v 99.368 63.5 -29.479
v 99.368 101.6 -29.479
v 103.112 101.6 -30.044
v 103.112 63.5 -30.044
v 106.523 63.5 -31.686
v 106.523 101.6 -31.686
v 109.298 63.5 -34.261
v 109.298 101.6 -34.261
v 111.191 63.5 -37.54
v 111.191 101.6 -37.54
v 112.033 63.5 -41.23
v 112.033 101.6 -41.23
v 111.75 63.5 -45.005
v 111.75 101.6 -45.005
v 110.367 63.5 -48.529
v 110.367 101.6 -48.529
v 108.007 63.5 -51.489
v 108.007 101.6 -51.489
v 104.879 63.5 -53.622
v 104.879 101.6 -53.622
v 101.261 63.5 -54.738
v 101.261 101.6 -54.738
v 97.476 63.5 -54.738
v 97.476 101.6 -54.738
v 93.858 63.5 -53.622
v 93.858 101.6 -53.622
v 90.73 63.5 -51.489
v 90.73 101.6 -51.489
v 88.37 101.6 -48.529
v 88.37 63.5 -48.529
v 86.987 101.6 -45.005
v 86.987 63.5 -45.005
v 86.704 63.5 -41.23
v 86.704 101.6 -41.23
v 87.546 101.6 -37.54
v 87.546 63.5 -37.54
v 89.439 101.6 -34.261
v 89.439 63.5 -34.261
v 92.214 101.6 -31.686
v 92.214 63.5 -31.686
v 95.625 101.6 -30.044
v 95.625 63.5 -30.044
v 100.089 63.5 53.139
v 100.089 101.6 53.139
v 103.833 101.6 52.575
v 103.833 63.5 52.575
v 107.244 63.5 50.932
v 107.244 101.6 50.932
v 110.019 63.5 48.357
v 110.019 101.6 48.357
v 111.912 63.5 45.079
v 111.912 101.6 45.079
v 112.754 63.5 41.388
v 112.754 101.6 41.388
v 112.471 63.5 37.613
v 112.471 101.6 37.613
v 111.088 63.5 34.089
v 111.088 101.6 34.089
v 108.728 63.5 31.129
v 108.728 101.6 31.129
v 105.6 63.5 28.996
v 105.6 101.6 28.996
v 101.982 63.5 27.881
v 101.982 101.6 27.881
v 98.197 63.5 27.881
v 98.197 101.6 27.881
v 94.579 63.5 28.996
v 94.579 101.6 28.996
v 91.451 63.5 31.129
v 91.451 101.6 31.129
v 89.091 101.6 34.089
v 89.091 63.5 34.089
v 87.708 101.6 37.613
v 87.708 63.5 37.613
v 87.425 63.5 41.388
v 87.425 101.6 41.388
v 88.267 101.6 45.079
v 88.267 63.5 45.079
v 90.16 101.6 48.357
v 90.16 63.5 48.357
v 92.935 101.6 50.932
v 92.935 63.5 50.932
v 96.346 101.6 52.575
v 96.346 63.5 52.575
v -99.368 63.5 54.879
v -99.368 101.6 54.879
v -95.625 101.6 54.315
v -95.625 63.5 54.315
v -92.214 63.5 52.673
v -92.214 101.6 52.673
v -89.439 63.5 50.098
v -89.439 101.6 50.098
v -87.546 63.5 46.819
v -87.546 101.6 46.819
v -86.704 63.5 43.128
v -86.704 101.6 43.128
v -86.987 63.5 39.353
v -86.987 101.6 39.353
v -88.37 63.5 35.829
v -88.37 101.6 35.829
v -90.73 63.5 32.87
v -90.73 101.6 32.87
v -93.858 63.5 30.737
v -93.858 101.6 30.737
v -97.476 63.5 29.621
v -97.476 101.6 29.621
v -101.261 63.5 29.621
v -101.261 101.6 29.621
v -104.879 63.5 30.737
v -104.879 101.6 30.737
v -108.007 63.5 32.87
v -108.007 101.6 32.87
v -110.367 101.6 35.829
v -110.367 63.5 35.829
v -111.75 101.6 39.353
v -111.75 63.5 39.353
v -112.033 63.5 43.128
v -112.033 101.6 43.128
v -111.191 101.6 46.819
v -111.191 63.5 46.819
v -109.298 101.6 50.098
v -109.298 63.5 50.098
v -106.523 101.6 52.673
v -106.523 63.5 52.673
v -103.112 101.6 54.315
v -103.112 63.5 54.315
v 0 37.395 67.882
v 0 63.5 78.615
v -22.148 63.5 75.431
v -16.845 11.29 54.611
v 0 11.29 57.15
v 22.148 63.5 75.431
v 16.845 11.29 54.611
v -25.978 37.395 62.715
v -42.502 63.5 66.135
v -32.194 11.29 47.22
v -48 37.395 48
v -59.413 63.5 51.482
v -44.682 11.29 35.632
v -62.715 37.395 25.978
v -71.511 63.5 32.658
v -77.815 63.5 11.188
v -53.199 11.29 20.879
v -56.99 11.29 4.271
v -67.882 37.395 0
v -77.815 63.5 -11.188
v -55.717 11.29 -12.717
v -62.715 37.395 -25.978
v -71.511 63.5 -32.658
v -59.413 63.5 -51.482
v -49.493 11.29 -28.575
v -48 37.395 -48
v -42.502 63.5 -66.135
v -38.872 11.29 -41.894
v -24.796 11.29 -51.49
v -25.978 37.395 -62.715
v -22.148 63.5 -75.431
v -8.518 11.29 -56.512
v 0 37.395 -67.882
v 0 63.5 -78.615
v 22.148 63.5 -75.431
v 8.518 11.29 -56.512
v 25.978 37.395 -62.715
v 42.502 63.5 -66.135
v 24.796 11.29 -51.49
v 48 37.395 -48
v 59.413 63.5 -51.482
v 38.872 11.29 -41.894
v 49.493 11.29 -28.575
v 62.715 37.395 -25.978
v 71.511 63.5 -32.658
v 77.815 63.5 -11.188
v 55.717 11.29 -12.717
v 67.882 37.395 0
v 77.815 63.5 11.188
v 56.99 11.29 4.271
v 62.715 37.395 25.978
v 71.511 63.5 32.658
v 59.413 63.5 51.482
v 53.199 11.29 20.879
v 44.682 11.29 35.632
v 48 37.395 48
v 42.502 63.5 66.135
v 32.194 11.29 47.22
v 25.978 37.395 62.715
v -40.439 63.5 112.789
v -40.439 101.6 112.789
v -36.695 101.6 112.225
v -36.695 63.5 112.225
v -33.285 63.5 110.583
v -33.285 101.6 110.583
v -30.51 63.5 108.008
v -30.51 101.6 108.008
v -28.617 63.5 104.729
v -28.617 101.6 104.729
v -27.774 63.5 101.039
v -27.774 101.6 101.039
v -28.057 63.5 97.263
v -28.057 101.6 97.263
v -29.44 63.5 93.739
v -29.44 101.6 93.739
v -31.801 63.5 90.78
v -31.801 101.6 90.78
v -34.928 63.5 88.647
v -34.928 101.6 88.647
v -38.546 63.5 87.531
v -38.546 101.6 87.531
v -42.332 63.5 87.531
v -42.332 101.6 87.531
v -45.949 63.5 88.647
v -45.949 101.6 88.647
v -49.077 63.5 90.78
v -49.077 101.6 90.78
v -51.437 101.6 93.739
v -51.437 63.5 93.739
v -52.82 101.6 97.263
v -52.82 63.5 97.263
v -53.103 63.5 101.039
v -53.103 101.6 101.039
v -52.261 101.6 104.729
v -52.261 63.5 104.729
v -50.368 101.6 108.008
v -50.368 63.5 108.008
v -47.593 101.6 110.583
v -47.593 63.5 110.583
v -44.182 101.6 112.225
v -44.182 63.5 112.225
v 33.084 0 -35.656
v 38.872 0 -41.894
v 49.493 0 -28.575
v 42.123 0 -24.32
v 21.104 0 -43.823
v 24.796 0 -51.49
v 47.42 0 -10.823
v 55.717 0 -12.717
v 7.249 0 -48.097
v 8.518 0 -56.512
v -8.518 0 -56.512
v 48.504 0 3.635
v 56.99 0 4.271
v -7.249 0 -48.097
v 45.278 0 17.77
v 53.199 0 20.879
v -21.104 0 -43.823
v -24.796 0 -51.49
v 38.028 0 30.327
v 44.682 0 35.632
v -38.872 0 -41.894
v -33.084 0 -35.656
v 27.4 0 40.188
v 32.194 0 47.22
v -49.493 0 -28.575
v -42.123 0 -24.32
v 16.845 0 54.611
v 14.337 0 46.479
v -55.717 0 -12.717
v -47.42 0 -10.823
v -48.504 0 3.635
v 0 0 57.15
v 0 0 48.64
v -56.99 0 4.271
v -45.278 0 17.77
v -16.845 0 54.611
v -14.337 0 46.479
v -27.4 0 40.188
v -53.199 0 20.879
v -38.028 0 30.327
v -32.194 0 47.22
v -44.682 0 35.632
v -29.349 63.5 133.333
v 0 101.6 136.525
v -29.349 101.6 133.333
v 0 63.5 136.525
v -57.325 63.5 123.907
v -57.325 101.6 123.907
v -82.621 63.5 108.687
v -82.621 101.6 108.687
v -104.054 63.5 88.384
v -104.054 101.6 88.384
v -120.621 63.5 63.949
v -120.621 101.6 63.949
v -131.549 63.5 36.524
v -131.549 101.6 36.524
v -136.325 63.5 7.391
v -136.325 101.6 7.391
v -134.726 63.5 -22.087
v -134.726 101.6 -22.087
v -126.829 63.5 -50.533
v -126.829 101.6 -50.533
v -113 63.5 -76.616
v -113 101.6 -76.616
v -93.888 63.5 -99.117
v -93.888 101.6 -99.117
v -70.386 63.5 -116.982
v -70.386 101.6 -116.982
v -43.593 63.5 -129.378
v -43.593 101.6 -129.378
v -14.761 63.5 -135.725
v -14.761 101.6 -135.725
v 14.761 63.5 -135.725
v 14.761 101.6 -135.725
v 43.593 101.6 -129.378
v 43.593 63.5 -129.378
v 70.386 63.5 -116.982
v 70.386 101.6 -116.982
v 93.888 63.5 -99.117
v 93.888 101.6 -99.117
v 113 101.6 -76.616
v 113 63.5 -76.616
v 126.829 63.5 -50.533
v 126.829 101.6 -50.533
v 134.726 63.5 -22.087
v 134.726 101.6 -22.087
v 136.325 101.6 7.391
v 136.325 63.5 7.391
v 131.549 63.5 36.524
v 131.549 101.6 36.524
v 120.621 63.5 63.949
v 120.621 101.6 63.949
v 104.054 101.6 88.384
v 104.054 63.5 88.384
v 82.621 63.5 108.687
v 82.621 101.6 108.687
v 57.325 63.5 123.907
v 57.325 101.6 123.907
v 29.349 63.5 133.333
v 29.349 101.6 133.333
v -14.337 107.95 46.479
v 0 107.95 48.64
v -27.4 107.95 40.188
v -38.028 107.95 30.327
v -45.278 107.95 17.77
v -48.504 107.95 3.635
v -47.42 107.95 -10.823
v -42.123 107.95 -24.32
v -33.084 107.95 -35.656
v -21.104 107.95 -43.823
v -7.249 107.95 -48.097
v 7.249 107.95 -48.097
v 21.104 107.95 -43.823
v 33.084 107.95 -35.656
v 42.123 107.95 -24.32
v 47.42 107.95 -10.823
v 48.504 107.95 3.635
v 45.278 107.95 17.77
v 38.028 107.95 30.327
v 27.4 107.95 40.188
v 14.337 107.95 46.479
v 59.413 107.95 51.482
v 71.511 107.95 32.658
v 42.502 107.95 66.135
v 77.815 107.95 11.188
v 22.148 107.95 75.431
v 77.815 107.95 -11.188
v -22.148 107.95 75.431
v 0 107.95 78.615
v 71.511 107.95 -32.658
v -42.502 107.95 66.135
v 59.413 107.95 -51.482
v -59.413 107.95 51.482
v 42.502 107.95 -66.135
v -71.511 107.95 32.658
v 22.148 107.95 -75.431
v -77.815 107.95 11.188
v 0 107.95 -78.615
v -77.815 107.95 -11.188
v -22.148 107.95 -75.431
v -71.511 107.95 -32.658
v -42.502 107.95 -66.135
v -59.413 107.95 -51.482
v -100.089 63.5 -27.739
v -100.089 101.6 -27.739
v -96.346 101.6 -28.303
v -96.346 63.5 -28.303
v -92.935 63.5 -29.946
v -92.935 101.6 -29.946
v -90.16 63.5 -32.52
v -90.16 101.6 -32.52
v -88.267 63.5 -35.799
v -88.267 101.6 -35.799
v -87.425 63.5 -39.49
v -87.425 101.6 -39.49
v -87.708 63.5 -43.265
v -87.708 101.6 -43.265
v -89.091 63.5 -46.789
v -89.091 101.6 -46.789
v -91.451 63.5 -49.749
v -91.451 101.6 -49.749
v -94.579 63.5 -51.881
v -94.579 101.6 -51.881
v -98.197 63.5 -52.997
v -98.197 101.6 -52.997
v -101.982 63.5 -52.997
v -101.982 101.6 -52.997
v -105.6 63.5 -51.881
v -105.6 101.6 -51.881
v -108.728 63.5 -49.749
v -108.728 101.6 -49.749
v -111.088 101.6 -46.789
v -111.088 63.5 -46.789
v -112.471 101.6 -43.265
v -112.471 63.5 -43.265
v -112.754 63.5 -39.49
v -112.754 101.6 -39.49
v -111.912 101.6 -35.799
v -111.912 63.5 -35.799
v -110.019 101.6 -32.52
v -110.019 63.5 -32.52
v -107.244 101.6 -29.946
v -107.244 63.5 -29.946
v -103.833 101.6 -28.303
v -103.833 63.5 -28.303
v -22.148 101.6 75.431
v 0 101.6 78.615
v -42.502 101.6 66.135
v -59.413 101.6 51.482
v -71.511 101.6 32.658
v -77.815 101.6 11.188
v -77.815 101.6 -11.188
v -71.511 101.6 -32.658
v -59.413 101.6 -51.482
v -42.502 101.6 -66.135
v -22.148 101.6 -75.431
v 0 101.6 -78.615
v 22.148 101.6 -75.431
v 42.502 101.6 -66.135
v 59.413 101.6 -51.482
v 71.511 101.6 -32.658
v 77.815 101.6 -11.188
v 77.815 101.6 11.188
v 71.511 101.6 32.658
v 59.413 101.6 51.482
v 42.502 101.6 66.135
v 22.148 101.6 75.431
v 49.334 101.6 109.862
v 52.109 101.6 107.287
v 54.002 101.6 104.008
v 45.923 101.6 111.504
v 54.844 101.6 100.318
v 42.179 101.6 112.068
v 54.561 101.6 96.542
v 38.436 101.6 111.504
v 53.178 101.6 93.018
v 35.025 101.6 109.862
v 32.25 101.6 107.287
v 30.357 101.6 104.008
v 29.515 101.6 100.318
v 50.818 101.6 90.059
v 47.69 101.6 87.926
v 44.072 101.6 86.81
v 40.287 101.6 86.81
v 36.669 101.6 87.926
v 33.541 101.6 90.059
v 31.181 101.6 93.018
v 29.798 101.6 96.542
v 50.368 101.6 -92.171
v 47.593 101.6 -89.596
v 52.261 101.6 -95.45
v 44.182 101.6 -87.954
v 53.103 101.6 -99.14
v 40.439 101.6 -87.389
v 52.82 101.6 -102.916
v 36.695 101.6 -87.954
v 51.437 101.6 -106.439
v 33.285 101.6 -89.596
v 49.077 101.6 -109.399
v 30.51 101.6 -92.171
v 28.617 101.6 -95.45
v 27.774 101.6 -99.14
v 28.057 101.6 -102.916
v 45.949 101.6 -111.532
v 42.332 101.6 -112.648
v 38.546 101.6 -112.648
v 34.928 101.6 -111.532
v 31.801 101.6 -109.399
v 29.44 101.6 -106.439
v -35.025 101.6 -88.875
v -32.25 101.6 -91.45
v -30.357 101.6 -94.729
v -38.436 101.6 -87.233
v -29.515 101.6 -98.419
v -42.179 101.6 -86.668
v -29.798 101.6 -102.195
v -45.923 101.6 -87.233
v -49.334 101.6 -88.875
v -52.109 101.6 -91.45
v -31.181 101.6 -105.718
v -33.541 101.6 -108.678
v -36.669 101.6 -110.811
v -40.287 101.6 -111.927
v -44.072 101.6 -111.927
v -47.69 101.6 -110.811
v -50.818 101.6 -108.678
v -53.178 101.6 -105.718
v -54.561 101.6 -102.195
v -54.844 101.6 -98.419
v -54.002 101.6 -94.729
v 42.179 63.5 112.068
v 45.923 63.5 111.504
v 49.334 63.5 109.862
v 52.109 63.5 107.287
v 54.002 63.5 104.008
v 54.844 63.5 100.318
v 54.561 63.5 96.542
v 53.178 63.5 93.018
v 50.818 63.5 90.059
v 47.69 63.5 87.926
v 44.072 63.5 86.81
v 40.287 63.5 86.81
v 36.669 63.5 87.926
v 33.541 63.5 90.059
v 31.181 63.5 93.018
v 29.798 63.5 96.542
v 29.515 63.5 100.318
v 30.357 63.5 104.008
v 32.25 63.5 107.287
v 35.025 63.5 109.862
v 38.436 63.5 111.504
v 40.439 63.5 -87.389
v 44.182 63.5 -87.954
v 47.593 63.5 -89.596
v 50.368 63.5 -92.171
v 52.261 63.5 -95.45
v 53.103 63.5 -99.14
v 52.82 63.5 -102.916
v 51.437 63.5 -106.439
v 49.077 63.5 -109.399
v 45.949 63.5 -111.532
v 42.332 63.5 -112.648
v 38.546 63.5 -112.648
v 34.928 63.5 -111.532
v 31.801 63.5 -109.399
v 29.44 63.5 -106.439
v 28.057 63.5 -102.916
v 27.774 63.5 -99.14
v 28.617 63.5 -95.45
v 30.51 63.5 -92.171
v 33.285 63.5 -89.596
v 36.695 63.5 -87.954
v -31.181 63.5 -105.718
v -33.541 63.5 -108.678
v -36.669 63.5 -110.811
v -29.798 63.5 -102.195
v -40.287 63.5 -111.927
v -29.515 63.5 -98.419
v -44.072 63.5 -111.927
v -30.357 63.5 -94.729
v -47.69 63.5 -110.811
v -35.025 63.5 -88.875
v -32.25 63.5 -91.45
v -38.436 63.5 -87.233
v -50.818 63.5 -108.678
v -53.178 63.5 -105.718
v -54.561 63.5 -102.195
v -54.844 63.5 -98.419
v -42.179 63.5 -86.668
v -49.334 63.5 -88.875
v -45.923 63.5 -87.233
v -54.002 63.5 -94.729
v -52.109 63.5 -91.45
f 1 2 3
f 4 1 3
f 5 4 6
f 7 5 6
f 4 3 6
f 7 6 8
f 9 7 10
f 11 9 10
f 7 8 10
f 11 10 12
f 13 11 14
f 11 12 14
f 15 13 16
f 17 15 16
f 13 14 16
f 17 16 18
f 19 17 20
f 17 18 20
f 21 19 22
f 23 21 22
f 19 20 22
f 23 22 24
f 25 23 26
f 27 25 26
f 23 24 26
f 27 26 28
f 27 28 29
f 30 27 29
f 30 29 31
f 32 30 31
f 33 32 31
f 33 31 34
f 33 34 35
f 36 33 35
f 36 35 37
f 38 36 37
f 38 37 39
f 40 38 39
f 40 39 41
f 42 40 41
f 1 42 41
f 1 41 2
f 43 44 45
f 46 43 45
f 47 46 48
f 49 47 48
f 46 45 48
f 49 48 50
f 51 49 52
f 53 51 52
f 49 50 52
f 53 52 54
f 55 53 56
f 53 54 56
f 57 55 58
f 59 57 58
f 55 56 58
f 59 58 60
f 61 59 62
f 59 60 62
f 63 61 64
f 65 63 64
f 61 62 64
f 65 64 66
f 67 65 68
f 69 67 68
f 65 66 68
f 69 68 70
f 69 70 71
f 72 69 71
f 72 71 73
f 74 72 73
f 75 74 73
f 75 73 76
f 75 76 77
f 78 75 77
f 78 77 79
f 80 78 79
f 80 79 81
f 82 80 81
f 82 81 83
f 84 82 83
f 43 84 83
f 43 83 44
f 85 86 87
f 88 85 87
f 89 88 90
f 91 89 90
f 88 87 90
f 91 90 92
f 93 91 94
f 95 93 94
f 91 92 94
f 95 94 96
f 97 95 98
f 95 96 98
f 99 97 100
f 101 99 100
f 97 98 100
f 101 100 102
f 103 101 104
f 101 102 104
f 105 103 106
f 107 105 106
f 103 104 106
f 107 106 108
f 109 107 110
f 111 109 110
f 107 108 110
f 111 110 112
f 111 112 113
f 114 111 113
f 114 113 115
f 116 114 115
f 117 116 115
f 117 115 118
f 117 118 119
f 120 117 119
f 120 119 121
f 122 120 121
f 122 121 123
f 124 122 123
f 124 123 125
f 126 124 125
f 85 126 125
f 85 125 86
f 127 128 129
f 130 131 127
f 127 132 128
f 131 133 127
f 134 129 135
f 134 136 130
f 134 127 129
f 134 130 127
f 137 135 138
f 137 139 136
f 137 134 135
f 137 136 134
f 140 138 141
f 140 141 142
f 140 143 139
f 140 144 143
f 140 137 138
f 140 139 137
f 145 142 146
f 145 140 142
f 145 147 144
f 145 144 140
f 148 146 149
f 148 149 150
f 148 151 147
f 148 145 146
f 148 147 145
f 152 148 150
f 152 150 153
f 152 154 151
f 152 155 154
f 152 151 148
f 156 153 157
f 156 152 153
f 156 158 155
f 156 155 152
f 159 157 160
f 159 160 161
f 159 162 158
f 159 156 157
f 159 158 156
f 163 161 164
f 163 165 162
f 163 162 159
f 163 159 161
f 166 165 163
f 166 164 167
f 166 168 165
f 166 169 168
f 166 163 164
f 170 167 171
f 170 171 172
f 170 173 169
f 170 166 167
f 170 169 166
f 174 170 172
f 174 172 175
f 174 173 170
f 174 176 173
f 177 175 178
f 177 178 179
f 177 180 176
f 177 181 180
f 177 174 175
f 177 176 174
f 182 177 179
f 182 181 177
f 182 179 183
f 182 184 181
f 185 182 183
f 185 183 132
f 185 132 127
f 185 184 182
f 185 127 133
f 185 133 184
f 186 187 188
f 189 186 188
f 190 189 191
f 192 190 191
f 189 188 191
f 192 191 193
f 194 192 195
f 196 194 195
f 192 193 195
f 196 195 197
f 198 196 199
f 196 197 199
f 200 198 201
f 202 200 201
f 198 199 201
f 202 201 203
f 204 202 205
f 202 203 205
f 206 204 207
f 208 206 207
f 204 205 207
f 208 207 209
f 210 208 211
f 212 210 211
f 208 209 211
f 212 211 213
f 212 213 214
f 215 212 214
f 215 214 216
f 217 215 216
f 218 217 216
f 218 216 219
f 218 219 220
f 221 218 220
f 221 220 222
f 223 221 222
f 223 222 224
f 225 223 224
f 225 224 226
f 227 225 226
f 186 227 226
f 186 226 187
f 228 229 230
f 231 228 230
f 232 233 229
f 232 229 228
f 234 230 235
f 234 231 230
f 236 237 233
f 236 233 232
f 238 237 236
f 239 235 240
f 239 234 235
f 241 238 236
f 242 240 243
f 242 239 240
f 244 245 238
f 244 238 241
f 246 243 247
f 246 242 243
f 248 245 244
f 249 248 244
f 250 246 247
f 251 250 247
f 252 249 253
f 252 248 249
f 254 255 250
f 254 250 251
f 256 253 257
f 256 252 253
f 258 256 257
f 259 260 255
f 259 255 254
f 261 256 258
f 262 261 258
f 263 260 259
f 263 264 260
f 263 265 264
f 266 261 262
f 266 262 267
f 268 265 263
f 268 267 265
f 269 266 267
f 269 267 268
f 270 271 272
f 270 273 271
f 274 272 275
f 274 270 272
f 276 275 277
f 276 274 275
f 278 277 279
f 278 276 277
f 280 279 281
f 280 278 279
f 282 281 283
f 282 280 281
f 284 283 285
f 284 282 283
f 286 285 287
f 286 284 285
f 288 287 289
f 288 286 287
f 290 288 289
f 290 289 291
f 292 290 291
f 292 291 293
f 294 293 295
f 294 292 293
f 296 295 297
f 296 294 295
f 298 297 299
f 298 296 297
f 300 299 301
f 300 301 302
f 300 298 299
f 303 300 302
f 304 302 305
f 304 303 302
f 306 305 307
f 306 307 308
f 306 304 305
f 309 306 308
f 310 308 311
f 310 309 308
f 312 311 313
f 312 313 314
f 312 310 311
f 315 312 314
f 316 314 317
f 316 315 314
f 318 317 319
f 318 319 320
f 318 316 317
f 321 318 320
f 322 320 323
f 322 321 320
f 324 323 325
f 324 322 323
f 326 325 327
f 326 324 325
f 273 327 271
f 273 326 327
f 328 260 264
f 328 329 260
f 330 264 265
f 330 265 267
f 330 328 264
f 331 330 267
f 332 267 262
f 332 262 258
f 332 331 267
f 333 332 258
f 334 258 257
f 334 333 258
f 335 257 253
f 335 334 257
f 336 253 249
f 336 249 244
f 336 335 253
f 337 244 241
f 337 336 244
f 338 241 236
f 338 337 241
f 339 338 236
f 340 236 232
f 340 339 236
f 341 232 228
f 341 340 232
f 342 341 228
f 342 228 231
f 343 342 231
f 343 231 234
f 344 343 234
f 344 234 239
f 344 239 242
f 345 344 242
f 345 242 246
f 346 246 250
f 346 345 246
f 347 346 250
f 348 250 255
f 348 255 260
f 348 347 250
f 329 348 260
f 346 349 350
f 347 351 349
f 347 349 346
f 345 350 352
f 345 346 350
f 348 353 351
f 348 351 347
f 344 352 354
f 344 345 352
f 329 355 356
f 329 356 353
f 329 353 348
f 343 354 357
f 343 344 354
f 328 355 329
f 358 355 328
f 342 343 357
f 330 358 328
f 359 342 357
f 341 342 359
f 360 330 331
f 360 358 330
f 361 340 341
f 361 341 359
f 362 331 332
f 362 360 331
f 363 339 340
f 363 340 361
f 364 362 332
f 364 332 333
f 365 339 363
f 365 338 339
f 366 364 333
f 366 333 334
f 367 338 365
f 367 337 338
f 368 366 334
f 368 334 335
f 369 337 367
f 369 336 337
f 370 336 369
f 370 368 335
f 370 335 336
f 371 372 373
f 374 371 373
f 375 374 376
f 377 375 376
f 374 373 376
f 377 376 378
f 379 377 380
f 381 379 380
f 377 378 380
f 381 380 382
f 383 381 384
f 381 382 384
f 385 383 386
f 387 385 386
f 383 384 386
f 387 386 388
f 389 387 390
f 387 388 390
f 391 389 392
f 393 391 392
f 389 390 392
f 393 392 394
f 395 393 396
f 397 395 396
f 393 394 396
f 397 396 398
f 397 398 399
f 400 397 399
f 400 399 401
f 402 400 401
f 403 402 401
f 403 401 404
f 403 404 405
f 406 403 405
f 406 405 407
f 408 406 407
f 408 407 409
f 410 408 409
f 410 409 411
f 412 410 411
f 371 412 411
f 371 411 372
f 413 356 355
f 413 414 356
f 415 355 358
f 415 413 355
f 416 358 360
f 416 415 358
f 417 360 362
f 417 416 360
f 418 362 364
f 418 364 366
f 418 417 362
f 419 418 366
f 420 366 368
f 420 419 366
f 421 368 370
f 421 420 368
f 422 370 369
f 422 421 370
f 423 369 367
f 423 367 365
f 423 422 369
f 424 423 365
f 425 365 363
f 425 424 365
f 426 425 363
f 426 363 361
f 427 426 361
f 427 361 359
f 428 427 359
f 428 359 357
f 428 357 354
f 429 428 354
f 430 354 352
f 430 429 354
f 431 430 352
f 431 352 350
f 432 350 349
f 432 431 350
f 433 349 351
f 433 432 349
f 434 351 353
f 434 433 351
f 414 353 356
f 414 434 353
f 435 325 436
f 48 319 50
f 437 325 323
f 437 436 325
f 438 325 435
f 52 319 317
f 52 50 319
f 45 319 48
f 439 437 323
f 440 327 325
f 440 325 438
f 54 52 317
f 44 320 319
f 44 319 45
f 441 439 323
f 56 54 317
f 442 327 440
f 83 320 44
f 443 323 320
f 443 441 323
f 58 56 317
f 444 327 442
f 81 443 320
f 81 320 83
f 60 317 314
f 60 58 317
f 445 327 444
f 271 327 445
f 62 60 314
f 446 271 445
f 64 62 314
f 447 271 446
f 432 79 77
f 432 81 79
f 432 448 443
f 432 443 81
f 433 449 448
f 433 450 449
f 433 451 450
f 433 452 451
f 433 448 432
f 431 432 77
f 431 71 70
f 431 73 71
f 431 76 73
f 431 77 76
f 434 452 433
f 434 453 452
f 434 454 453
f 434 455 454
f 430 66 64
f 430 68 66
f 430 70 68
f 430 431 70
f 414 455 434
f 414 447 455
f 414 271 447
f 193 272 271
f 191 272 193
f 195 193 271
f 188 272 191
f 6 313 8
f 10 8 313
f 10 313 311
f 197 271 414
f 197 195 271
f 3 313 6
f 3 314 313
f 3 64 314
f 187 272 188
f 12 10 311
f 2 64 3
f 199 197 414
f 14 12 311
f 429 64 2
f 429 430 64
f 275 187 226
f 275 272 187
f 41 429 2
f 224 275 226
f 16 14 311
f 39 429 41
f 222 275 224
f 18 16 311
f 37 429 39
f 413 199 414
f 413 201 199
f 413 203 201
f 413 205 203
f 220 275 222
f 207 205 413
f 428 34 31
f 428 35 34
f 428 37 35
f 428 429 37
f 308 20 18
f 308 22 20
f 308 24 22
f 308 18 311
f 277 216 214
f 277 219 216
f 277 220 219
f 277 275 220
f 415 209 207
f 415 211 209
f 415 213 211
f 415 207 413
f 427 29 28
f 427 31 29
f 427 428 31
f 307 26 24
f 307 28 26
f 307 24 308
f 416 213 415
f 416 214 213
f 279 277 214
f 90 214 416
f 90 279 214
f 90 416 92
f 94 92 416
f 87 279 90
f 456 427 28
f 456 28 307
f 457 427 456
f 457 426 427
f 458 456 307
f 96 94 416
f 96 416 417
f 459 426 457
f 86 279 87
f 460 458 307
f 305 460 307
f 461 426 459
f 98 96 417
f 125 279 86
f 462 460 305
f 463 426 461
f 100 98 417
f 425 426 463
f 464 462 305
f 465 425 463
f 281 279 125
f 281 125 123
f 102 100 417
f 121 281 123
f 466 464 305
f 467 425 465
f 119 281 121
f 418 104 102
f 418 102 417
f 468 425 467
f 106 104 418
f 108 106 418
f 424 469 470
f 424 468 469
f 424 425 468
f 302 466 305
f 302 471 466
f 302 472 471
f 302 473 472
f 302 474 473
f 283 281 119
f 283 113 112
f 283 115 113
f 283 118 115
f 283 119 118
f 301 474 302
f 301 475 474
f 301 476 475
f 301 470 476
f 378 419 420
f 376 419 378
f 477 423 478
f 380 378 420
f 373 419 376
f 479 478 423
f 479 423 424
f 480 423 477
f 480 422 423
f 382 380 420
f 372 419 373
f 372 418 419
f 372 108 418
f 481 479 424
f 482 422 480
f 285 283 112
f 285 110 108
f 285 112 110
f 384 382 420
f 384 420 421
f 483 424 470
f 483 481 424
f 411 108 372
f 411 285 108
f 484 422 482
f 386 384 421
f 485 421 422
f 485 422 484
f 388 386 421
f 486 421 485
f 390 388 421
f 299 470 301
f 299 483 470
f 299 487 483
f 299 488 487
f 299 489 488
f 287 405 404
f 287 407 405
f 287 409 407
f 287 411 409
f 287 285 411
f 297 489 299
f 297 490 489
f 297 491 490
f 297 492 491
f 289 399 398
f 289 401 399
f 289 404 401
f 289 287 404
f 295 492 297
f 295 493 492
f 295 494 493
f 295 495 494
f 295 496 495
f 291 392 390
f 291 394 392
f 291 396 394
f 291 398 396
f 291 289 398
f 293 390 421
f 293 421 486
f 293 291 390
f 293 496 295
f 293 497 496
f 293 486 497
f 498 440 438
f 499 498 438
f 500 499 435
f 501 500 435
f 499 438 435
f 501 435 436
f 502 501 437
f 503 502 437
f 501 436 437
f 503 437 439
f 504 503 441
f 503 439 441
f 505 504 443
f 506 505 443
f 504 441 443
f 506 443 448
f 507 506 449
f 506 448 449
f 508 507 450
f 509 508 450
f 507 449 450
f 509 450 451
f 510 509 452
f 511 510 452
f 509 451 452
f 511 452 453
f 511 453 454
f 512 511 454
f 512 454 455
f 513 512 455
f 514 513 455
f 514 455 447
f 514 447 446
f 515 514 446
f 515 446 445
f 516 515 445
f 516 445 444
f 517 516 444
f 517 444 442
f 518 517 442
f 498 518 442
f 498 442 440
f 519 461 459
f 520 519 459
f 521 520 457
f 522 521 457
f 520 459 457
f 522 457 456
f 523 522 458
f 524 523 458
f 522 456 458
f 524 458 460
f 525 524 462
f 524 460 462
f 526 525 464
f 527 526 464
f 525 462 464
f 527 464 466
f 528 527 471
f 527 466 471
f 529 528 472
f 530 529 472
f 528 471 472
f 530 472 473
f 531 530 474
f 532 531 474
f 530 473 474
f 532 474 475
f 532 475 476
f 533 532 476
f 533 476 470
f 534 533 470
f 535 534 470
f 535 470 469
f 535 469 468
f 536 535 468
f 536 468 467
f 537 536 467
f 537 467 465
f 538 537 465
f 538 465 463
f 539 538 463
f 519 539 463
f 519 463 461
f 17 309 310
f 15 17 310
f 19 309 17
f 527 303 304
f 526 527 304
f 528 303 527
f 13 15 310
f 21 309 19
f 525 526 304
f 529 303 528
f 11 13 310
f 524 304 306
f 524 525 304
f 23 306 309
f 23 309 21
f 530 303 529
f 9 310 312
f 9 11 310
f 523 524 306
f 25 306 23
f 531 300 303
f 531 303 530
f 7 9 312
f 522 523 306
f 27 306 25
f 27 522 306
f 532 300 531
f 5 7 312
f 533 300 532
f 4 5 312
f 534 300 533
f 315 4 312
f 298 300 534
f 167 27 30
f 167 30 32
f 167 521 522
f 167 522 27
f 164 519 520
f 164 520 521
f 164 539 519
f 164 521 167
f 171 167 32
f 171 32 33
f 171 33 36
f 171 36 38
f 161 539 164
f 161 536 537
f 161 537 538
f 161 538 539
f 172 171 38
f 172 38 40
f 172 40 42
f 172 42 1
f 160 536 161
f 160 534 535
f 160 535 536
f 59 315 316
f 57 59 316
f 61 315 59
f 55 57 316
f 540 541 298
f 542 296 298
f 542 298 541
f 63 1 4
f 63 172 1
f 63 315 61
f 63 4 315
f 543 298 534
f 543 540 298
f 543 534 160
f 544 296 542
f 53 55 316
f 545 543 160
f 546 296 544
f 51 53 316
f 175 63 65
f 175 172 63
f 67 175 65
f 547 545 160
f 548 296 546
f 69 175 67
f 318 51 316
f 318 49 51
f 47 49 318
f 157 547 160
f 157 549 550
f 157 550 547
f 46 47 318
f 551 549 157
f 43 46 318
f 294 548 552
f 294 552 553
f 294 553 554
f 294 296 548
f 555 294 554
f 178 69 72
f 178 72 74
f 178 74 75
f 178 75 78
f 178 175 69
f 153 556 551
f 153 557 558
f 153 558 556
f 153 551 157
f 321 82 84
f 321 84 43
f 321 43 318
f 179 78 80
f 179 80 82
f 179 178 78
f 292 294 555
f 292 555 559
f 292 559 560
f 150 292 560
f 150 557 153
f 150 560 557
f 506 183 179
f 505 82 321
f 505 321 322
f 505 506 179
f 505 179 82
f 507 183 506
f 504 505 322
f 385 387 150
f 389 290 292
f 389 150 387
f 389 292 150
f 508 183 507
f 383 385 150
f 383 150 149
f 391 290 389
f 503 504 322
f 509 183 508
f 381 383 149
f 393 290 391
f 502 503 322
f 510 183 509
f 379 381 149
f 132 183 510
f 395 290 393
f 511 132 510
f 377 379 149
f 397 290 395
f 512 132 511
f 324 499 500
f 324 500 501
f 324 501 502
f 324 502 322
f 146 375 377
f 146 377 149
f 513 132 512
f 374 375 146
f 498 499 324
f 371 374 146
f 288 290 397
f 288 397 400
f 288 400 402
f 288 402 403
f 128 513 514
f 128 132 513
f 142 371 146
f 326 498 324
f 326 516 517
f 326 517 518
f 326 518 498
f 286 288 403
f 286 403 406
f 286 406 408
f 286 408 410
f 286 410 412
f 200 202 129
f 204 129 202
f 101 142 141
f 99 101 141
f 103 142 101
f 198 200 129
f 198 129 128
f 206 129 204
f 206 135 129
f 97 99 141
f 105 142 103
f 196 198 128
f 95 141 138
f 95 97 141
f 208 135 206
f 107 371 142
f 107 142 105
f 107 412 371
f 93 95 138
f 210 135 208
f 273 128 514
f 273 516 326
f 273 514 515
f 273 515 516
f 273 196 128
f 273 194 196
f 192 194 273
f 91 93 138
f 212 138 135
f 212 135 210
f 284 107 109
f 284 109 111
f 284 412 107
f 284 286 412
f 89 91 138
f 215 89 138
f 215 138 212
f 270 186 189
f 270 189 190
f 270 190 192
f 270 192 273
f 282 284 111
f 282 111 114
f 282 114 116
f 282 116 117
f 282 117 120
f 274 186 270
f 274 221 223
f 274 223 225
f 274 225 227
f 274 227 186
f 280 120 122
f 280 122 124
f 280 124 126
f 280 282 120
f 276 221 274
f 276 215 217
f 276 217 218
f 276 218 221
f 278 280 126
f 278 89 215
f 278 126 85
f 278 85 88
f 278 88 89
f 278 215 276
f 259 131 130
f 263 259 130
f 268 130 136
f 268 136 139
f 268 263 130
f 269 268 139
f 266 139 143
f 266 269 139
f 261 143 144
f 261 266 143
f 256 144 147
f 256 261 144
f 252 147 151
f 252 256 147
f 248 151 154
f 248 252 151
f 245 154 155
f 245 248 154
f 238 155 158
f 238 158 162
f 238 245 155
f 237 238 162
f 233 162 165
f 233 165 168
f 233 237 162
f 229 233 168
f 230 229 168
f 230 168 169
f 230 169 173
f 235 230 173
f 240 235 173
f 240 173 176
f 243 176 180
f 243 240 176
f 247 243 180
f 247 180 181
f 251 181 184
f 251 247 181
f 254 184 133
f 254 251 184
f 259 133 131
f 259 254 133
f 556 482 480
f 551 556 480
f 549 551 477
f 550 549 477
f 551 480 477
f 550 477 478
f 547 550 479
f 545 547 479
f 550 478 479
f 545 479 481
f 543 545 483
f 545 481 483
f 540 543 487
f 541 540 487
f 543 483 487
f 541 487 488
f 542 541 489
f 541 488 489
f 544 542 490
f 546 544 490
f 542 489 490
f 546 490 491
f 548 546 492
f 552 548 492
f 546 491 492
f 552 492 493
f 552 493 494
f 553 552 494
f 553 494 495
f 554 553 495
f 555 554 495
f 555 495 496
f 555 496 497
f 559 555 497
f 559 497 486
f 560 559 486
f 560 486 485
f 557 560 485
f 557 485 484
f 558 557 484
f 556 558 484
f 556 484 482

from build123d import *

# Parameters (mm, degrees)
SKETCH2_R          = 12.7
CUT_EXTRUDE1_DEPTH = 53


with BuildPart() as part:
    # Sketch1 → Revolve1 (revolve)
    with BuildSketch(Plane.XY, mode=Mode.PRIVATE) as revolve1_sk:
        Polygon((48.64, 0), (48.64, 107.95), (78.615, 107.95), (78.615, 101.6), (136.525, 101.6), (136.525, 63.5), (78.615, 63.5), (57.15, 11.29), (57.15, 0), align=None)
    revolve(revolve1_sk.sketch.rotate(Axis((0, 145.426192893, 0), (0, -1, 0)), 90), axis=Axis((0, 145.426192893, 0), (0, -1, 0)))

    # Sketch2 → Cut-Extrude1 (cut)
    with BuildSketch(Plane(origin=(0, 101.6, 0), x_dir=(1, 0, 0), z_dir=(0, 1, 0))):
        with Locations(Location((-42.17942532, 99.36849893, 0), (0, 0, 270))):
            Circle(SKETCH2_R)
        with Locations(Location((40.438781759, 100.0894971, 0), (0, 0, 270))):
            Circle(SKETCH2_R)
        with Locations(Location((99.36849893, 42.17942532, 0), (0, 0, 270))):
            Circle(SKETCH2_R)
        with Locations(Location((100.0894971, -40.438781759, 0), (0, 0, 270))):
            Circle(SKETCH2_R)
        with Locations(Location((42.17942532, -99.36849893, 0), (0, 0, 270))):
            Circle(SKETCH2_R)
        with Locations(Location((-40.438781759, -100.0894971, 0), (0, 0, 270))):
            Circle(SKETCH2_R)
        with Locations(Location((-99.36849893, -42.17942532, 0), (0, 0, 270))):
            Circle(SKETCH2_R)
        with Locations(Location((-100.0894971, 40.438781759, 0), (0, 0, 270))):
            Circle(SKETCH2_R)
    extrude(amount=-CUT_EXTRUDE1_DEPTH, mode=Mode.SUBTRACT)


solid = part.part
